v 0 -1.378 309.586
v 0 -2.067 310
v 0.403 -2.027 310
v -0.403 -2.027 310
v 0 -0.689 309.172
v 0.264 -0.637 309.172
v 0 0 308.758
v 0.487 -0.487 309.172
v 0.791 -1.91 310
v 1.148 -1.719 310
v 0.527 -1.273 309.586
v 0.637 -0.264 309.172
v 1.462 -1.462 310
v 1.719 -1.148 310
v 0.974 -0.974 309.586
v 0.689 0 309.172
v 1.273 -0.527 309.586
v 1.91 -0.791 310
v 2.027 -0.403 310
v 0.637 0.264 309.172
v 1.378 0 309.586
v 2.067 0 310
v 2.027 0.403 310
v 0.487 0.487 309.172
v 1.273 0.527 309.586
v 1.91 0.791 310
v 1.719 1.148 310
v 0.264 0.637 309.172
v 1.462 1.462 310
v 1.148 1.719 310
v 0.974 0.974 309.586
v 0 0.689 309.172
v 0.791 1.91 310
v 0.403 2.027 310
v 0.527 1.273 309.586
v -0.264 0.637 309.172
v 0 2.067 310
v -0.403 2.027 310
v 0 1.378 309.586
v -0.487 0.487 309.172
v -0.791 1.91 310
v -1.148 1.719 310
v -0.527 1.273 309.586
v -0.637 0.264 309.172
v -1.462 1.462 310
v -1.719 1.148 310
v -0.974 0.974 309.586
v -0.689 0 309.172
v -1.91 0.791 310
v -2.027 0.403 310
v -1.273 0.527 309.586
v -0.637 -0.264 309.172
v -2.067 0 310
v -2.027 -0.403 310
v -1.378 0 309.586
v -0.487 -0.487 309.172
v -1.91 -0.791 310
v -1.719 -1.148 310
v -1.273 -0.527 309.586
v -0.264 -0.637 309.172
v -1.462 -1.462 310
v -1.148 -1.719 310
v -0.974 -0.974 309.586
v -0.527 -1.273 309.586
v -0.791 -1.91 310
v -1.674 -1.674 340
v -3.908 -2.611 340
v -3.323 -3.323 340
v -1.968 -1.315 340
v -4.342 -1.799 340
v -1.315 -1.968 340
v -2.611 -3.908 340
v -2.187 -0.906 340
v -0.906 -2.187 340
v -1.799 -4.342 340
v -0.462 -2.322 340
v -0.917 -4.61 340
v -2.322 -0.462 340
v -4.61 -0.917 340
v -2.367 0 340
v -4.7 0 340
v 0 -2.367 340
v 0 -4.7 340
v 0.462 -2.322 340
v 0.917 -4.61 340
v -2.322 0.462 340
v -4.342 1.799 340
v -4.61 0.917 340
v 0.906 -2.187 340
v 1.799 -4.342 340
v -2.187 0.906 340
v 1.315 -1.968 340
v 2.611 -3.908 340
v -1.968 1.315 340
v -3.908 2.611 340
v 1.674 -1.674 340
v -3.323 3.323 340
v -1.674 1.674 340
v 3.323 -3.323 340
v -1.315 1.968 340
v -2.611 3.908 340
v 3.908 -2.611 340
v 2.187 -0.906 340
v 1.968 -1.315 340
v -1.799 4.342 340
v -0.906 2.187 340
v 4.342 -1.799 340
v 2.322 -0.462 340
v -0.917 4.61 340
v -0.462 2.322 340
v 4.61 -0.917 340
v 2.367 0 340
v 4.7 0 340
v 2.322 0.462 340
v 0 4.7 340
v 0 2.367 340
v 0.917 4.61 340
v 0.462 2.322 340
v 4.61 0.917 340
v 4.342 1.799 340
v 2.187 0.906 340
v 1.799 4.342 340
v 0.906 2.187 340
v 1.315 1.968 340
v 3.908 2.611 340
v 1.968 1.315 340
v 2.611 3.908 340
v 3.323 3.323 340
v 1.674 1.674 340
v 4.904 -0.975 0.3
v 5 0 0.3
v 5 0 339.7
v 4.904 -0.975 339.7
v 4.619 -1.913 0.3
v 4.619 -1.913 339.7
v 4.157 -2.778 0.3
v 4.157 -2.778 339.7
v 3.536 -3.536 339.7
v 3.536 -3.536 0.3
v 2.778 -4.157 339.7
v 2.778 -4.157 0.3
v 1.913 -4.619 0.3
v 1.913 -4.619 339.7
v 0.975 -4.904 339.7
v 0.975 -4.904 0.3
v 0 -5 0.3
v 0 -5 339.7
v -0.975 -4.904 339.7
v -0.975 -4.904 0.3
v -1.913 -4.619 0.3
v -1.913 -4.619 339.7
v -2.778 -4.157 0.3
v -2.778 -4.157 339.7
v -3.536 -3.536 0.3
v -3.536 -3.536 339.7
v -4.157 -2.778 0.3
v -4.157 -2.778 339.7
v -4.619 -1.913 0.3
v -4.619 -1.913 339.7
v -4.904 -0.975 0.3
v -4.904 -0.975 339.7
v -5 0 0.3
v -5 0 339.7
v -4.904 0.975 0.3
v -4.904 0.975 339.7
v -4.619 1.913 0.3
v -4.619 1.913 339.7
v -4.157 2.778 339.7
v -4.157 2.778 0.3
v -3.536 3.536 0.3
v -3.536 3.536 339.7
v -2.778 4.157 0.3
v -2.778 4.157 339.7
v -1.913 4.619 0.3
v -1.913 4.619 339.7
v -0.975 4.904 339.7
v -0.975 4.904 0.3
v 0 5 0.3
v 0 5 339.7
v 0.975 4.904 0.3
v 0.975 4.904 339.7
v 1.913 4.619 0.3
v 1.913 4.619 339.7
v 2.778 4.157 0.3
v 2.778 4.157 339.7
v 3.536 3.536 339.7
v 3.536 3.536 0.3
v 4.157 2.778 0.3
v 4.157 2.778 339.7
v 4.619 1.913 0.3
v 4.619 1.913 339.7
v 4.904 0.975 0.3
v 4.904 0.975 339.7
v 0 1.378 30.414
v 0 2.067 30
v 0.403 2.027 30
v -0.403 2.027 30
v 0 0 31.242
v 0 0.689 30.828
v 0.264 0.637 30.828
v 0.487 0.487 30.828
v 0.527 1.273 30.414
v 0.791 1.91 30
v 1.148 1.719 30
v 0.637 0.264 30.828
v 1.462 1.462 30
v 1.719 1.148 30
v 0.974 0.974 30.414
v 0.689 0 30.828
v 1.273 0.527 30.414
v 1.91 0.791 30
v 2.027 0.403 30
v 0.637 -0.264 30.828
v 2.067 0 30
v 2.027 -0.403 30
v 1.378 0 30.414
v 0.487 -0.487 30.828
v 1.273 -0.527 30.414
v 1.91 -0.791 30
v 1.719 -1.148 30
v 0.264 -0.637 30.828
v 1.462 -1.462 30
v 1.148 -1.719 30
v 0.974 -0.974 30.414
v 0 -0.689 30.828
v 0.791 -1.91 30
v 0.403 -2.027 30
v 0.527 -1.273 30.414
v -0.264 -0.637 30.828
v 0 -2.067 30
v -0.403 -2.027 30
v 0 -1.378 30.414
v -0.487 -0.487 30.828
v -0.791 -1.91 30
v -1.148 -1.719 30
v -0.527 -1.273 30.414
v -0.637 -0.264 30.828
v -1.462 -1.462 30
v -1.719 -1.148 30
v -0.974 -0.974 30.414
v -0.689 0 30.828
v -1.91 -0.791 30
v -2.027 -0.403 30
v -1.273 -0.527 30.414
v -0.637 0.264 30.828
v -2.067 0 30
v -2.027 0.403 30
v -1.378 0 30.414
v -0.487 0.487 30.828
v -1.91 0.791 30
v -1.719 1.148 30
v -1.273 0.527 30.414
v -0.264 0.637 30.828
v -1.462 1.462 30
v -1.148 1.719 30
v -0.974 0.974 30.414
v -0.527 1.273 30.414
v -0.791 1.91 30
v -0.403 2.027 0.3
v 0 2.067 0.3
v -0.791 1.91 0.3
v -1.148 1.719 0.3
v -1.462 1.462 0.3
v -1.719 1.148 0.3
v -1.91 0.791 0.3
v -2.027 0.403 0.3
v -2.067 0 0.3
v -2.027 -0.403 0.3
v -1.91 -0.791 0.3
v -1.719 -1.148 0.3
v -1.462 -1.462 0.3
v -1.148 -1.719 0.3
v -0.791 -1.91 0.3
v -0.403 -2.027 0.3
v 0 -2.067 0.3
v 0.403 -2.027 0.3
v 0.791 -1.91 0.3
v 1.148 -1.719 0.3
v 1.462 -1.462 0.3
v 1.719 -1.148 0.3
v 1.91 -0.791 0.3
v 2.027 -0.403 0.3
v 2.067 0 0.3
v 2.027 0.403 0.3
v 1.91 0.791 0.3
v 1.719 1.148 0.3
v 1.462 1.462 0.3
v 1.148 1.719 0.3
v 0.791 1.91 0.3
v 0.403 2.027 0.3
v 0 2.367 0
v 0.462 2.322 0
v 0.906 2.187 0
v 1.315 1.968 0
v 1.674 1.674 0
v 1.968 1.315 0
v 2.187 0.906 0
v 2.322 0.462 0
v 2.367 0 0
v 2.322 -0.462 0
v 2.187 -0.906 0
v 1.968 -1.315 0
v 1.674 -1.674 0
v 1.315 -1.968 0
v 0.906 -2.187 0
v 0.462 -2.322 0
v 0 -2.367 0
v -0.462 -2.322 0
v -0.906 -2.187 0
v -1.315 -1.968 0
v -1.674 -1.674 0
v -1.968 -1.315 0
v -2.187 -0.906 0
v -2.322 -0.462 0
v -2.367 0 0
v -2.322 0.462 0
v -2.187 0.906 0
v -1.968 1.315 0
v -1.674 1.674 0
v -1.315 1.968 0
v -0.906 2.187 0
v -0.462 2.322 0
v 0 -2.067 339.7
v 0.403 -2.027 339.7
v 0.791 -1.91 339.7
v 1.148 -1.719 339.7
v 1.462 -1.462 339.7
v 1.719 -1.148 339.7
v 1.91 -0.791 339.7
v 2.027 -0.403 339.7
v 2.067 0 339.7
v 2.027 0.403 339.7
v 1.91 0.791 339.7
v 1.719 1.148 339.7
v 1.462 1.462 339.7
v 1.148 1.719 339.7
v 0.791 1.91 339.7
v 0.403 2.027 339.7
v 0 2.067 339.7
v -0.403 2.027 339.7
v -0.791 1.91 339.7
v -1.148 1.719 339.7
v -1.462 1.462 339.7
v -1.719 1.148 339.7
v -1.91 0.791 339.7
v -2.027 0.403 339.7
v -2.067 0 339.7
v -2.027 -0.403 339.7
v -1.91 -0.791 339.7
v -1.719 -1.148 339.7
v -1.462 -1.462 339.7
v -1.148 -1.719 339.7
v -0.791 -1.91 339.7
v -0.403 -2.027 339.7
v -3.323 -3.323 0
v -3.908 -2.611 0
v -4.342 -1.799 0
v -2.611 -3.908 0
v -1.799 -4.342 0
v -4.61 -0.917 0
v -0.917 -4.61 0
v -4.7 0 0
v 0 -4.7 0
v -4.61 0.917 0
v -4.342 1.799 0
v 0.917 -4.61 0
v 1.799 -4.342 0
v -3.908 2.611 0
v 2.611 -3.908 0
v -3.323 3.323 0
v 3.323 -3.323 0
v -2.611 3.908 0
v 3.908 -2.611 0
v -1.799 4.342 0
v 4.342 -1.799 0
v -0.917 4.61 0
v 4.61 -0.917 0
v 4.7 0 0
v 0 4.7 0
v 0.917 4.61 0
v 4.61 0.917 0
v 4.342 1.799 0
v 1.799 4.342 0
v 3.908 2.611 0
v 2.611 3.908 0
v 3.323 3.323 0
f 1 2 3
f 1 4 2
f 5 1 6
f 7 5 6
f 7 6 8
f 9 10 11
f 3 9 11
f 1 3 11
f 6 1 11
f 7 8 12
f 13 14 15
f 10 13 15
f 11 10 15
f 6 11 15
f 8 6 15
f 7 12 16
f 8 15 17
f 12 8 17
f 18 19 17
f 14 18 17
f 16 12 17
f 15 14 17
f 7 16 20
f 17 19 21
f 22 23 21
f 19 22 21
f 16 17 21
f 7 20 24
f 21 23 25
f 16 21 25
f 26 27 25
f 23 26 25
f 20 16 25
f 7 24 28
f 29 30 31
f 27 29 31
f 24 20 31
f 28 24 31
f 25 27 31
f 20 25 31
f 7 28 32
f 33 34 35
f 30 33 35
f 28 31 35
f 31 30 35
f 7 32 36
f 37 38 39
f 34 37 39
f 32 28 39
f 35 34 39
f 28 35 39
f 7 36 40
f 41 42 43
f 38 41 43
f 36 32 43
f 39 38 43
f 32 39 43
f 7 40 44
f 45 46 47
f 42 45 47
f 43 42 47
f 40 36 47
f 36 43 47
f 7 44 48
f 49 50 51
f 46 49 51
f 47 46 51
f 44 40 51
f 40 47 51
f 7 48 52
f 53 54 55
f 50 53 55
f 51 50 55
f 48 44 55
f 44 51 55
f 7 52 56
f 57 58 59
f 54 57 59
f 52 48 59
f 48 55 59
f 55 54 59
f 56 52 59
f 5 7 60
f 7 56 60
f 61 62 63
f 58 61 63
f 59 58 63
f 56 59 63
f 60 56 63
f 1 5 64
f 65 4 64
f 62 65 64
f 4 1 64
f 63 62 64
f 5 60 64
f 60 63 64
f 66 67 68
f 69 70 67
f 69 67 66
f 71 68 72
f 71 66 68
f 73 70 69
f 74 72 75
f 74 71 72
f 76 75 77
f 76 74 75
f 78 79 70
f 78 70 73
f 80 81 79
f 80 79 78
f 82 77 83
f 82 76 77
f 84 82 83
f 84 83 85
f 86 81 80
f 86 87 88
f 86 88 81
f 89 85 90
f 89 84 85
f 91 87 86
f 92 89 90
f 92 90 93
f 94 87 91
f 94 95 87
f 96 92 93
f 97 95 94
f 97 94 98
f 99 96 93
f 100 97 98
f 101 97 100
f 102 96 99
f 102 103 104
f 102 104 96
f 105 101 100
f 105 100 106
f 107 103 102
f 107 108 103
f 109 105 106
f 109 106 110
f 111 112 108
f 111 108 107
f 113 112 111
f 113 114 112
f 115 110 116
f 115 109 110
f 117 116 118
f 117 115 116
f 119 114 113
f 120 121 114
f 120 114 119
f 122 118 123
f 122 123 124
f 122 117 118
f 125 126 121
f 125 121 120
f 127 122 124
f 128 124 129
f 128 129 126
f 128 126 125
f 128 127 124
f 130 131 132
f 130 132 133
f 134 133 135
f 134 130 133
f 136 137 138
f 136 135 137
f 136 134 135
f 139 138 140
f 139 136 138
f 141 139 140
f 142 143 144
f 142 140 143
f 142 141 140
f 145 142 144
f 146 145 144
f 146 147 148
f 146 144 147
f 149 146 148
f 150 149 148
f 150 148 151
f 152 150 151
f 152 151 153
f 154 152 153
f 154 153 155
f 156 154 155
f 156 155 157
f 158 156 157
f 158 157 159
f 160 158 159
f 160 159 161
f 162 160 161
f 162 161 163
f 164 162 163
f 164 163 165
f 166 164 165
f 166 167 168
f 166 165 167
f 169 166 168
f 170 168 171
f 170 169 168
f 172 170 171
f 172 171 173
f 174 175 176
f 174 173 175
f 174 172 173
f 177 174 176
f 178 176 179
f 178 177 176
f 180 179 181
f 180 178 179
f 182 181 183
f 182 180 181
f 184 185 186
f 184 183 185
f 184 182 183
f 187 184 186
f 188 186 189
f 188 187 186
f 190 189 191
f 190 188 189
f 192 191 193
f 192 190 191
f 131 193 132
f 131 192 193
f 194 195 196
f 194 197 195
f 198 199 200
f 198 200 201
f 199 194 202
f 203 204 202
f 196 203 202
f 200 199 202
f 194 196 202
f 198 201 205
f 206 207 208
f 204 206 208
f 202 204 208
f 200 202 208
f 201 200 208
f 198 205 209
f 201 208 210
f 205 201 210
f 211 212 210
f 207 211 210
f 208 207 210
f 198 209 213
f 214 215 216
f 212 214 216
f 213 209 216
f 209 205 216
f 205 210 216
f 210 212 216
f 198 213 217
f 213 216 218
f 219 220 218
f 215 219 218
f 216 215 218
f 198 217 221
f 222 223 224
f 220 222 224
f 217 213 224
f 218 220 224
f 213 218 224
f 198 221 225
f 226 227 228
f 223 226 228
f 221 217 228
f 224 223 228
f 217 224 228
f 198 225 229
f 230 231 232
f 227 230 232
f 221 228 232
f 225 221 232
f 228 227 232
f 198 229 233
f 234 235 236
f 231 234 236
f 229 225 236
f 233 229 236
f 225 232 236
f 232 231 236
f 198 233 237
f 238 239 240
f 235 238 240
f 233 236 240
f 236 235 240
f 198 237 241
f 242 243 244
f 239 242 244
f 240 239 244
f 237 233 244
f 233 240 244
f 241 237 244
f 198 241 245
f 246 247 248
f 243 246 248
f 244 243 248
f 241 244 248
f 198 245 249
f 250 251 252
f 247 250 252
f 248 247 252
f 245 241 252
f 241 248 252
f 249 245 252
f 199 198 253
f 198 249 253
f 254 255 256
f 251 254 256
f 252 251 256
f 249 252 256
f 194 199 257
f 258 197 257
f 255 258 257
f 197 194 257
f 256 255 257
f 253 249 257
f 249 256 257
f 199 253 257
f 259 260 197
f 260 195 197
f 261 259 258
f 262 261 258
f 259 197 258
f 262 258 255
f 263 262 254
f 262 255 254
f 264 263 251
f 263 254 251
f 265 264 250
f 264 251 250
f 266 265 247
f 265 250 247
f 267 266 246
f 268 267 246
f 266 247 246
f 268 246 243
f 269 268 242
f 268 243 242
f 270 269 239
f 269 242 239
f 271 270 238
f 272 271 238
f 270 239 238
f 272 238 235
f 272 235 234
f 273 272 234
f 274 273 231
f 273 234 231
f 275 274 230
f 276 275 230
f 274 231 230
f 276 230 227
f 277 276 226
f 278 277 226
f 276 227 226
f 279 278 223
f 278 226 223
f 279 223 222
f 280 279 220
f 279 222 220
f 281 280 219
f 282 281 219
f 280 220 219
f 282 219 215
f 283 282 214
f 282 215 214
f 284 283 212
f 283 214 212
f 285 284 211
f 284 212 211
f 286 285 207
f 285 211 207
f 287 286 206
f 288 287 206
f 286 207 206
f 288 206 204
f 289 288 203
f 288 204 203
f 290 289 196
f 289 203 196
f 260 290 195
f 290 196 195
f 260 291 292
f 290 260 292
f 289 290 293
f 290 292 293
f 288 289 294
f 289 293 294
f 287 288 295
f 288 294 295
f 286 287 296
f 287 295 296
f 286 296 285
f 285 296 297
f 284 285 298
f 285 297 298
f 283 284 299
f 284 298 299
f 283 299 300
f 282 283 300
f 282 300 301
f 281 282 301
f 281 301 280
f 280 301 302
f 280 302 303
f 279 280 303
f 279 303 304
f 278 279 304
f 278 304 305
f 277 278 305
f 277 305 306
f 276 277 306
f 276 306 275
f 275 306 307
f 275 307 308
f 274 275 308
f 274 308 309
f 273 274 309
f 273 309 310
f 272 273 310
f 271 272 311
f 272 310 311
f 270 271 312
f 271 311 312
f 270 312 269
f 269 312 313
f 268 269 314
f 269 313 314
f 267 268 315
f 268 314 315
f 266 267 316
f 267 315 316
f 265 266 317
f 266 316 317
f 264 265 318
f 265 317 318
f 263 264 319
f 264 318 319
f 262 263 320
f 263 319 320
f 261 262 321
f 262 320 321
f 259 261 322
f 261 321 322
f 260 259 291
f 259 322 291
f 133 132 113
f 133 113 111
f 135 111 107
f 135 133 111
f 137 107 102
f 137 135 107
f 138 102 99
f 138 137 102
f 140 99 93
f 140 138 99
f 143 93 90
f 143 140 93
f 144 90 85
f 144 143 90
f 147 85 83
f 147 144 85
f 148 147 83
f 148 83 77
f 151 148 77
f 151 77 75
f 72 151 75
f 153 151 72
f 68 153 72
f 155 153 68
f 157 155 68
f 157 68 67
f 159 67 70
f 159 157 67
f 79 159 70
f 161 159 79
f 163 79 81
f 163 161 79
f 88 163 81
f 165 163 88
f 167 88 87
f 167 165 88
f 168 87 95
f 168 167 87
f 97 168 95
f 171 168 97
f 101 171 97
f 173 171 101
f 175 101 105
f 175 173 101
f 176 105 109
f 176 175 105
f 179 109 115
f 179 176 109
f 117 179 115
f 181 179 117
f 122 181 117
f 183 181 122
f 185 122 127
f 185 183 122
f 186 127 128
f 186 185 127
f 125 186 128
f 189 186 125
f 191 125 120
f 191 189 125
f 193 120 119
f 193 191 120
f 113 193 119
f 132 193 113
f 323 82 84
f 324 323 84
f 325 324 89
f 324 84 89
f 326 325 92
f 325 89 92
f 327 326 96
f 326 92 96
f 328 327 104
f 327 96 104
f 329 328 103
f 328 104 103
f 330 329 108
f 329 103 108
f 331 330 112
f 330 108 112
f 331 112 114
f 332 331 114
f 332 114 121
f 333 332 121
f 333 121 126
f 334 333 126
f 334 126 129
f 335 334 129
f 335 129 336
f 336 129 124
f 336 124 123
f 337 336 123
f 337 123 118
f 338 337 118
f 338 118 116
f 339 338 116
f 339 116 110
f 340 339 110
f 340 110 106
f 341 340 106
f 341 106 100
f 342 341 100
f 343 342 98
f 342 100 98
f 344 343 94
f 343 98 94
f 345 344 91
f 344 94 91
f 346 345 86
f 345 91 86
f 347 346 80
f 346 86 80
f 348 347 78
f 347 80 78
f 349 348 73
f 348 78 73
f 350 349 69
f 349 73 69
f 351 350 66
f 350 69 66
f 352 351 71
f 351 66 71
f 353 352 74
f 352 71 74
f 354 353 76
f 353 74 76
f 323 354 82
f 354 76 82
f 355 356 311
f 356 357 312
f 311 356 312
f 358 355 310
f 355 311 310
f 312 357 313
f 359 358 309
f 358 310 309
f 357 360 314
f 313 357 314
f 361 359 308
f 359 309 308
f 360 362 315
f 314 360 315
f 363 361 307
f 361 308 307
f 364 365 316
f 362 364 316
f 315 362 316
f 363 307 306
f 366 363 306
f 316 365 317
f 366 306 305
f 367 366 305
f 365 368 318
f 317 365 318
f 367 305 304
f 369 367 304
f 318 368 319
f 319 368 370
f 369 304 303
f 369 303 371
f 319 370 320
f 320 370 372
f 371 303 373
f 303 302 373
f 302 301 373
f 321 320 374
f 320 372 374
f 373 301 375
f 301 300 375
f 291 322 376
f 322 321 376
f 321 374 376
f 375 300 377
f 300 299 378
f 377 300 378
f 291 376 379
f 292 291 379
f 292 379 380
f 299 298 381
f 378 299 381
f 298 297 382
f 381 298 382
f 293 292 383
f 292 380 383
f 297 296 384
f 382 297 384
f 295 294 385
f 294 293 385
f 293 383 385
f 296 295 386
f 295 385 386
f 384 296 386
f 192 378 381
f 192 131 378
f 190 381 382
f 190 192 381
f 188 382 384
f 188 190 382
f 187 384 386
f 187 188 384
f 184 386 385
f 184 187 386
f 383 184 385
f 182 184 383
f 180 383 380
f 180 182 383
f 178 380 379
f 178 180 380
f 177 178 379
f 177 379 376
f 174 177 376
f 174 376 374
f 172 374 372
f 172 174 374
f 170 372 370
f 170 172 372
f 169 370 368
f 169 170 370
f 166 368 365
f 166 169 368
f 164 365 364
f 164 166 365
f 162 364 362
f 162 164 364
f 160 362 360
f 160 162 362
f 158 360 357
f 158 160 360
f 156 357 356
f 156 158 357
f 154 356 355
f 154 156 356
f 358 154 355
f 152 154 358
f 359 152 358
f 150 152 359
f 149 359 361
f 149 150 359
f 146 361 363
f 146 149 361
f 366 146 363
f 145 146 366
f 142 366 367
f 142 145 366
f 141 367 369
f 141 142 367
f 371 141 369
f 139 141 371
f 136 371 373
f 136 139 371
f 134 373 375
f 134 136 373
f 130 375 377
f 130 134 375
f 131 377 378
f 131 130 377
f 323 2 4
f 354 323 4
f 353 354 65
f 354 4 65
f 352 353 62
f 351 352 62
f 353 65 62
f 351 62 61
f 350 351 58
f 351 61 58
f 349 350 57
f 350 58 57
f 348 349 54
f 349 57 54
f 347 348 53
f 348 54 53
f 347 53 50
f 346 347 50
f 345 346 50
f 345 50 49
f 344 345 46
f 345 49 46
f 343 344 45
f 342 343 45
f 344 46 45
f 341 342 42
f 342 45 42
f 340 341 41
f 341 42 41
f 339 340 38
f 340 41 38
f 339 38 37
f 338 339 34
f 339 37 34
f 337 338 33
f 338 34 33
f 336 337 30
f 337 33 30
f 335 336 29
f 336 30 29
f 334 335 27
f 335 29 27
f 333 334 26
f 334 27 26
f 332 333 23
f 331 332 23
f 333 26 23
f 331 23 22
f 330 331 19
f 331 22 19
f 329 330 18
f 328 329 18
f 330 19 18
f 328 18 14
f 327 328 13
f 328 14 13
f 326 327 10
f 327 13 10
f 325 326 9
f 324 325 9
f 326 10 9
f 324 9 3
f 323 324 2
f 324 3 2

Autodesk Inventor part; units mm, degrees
ref_plane "YZ Plane" through (0, 0, 0) normal (1, 0, 0) x (0, 1, 0)
ref_plane "XZ Plane" through (0, 0, 0) normal (0, 1, 0) x (-1, 0, 0)
ref_plane "XY Plane" through (0, 0, 0) normal (0, 0, 1) x (1, 0, 0)
sketch "スケッチ1" plane through (0, 0, 0) normal (0, 0, 1) x (1, 0, 0)
  circle A0 centre (0, 0) radius 5
  dimension "d0" = 10
extrude "押し出し1" add sketch "スケッチ1" along normal blind 340
sketch "スケッチ2" plane through (0, 0, 340) normal (0, 0, 1) x (1, 0, 0)
  point P0 (0, 0)
sketch "スケッチ3" plane through (0, 0, 0) normal (0, 0, -1) x (-1, 0, 0)
  point P0 (0, 0)
hole "穴1" at (0, 0, 340) direction (0, 0, -1) diameter 4.134 depth 30 tip angle 118 thread size "M5x0.8" class "6H" standard "ISO Metric profile"
hole "穴2" at (0, 0, 0) direction (0, 0, 1) diameter 4.134 depth 30 tip angle 118 thread size "M5x0.8" class "6H" standard "ISO Metric profile"
chamfer "面取り1" distance 0.3 angle 45 4 edges at (-5, 0, 340) (-5, 0, 0) (0, 2.067, 340) (0, -2.067, 0)
properties part number "BaseSlide_p10ALshaft" material "アルミニウム 2014-T6"
